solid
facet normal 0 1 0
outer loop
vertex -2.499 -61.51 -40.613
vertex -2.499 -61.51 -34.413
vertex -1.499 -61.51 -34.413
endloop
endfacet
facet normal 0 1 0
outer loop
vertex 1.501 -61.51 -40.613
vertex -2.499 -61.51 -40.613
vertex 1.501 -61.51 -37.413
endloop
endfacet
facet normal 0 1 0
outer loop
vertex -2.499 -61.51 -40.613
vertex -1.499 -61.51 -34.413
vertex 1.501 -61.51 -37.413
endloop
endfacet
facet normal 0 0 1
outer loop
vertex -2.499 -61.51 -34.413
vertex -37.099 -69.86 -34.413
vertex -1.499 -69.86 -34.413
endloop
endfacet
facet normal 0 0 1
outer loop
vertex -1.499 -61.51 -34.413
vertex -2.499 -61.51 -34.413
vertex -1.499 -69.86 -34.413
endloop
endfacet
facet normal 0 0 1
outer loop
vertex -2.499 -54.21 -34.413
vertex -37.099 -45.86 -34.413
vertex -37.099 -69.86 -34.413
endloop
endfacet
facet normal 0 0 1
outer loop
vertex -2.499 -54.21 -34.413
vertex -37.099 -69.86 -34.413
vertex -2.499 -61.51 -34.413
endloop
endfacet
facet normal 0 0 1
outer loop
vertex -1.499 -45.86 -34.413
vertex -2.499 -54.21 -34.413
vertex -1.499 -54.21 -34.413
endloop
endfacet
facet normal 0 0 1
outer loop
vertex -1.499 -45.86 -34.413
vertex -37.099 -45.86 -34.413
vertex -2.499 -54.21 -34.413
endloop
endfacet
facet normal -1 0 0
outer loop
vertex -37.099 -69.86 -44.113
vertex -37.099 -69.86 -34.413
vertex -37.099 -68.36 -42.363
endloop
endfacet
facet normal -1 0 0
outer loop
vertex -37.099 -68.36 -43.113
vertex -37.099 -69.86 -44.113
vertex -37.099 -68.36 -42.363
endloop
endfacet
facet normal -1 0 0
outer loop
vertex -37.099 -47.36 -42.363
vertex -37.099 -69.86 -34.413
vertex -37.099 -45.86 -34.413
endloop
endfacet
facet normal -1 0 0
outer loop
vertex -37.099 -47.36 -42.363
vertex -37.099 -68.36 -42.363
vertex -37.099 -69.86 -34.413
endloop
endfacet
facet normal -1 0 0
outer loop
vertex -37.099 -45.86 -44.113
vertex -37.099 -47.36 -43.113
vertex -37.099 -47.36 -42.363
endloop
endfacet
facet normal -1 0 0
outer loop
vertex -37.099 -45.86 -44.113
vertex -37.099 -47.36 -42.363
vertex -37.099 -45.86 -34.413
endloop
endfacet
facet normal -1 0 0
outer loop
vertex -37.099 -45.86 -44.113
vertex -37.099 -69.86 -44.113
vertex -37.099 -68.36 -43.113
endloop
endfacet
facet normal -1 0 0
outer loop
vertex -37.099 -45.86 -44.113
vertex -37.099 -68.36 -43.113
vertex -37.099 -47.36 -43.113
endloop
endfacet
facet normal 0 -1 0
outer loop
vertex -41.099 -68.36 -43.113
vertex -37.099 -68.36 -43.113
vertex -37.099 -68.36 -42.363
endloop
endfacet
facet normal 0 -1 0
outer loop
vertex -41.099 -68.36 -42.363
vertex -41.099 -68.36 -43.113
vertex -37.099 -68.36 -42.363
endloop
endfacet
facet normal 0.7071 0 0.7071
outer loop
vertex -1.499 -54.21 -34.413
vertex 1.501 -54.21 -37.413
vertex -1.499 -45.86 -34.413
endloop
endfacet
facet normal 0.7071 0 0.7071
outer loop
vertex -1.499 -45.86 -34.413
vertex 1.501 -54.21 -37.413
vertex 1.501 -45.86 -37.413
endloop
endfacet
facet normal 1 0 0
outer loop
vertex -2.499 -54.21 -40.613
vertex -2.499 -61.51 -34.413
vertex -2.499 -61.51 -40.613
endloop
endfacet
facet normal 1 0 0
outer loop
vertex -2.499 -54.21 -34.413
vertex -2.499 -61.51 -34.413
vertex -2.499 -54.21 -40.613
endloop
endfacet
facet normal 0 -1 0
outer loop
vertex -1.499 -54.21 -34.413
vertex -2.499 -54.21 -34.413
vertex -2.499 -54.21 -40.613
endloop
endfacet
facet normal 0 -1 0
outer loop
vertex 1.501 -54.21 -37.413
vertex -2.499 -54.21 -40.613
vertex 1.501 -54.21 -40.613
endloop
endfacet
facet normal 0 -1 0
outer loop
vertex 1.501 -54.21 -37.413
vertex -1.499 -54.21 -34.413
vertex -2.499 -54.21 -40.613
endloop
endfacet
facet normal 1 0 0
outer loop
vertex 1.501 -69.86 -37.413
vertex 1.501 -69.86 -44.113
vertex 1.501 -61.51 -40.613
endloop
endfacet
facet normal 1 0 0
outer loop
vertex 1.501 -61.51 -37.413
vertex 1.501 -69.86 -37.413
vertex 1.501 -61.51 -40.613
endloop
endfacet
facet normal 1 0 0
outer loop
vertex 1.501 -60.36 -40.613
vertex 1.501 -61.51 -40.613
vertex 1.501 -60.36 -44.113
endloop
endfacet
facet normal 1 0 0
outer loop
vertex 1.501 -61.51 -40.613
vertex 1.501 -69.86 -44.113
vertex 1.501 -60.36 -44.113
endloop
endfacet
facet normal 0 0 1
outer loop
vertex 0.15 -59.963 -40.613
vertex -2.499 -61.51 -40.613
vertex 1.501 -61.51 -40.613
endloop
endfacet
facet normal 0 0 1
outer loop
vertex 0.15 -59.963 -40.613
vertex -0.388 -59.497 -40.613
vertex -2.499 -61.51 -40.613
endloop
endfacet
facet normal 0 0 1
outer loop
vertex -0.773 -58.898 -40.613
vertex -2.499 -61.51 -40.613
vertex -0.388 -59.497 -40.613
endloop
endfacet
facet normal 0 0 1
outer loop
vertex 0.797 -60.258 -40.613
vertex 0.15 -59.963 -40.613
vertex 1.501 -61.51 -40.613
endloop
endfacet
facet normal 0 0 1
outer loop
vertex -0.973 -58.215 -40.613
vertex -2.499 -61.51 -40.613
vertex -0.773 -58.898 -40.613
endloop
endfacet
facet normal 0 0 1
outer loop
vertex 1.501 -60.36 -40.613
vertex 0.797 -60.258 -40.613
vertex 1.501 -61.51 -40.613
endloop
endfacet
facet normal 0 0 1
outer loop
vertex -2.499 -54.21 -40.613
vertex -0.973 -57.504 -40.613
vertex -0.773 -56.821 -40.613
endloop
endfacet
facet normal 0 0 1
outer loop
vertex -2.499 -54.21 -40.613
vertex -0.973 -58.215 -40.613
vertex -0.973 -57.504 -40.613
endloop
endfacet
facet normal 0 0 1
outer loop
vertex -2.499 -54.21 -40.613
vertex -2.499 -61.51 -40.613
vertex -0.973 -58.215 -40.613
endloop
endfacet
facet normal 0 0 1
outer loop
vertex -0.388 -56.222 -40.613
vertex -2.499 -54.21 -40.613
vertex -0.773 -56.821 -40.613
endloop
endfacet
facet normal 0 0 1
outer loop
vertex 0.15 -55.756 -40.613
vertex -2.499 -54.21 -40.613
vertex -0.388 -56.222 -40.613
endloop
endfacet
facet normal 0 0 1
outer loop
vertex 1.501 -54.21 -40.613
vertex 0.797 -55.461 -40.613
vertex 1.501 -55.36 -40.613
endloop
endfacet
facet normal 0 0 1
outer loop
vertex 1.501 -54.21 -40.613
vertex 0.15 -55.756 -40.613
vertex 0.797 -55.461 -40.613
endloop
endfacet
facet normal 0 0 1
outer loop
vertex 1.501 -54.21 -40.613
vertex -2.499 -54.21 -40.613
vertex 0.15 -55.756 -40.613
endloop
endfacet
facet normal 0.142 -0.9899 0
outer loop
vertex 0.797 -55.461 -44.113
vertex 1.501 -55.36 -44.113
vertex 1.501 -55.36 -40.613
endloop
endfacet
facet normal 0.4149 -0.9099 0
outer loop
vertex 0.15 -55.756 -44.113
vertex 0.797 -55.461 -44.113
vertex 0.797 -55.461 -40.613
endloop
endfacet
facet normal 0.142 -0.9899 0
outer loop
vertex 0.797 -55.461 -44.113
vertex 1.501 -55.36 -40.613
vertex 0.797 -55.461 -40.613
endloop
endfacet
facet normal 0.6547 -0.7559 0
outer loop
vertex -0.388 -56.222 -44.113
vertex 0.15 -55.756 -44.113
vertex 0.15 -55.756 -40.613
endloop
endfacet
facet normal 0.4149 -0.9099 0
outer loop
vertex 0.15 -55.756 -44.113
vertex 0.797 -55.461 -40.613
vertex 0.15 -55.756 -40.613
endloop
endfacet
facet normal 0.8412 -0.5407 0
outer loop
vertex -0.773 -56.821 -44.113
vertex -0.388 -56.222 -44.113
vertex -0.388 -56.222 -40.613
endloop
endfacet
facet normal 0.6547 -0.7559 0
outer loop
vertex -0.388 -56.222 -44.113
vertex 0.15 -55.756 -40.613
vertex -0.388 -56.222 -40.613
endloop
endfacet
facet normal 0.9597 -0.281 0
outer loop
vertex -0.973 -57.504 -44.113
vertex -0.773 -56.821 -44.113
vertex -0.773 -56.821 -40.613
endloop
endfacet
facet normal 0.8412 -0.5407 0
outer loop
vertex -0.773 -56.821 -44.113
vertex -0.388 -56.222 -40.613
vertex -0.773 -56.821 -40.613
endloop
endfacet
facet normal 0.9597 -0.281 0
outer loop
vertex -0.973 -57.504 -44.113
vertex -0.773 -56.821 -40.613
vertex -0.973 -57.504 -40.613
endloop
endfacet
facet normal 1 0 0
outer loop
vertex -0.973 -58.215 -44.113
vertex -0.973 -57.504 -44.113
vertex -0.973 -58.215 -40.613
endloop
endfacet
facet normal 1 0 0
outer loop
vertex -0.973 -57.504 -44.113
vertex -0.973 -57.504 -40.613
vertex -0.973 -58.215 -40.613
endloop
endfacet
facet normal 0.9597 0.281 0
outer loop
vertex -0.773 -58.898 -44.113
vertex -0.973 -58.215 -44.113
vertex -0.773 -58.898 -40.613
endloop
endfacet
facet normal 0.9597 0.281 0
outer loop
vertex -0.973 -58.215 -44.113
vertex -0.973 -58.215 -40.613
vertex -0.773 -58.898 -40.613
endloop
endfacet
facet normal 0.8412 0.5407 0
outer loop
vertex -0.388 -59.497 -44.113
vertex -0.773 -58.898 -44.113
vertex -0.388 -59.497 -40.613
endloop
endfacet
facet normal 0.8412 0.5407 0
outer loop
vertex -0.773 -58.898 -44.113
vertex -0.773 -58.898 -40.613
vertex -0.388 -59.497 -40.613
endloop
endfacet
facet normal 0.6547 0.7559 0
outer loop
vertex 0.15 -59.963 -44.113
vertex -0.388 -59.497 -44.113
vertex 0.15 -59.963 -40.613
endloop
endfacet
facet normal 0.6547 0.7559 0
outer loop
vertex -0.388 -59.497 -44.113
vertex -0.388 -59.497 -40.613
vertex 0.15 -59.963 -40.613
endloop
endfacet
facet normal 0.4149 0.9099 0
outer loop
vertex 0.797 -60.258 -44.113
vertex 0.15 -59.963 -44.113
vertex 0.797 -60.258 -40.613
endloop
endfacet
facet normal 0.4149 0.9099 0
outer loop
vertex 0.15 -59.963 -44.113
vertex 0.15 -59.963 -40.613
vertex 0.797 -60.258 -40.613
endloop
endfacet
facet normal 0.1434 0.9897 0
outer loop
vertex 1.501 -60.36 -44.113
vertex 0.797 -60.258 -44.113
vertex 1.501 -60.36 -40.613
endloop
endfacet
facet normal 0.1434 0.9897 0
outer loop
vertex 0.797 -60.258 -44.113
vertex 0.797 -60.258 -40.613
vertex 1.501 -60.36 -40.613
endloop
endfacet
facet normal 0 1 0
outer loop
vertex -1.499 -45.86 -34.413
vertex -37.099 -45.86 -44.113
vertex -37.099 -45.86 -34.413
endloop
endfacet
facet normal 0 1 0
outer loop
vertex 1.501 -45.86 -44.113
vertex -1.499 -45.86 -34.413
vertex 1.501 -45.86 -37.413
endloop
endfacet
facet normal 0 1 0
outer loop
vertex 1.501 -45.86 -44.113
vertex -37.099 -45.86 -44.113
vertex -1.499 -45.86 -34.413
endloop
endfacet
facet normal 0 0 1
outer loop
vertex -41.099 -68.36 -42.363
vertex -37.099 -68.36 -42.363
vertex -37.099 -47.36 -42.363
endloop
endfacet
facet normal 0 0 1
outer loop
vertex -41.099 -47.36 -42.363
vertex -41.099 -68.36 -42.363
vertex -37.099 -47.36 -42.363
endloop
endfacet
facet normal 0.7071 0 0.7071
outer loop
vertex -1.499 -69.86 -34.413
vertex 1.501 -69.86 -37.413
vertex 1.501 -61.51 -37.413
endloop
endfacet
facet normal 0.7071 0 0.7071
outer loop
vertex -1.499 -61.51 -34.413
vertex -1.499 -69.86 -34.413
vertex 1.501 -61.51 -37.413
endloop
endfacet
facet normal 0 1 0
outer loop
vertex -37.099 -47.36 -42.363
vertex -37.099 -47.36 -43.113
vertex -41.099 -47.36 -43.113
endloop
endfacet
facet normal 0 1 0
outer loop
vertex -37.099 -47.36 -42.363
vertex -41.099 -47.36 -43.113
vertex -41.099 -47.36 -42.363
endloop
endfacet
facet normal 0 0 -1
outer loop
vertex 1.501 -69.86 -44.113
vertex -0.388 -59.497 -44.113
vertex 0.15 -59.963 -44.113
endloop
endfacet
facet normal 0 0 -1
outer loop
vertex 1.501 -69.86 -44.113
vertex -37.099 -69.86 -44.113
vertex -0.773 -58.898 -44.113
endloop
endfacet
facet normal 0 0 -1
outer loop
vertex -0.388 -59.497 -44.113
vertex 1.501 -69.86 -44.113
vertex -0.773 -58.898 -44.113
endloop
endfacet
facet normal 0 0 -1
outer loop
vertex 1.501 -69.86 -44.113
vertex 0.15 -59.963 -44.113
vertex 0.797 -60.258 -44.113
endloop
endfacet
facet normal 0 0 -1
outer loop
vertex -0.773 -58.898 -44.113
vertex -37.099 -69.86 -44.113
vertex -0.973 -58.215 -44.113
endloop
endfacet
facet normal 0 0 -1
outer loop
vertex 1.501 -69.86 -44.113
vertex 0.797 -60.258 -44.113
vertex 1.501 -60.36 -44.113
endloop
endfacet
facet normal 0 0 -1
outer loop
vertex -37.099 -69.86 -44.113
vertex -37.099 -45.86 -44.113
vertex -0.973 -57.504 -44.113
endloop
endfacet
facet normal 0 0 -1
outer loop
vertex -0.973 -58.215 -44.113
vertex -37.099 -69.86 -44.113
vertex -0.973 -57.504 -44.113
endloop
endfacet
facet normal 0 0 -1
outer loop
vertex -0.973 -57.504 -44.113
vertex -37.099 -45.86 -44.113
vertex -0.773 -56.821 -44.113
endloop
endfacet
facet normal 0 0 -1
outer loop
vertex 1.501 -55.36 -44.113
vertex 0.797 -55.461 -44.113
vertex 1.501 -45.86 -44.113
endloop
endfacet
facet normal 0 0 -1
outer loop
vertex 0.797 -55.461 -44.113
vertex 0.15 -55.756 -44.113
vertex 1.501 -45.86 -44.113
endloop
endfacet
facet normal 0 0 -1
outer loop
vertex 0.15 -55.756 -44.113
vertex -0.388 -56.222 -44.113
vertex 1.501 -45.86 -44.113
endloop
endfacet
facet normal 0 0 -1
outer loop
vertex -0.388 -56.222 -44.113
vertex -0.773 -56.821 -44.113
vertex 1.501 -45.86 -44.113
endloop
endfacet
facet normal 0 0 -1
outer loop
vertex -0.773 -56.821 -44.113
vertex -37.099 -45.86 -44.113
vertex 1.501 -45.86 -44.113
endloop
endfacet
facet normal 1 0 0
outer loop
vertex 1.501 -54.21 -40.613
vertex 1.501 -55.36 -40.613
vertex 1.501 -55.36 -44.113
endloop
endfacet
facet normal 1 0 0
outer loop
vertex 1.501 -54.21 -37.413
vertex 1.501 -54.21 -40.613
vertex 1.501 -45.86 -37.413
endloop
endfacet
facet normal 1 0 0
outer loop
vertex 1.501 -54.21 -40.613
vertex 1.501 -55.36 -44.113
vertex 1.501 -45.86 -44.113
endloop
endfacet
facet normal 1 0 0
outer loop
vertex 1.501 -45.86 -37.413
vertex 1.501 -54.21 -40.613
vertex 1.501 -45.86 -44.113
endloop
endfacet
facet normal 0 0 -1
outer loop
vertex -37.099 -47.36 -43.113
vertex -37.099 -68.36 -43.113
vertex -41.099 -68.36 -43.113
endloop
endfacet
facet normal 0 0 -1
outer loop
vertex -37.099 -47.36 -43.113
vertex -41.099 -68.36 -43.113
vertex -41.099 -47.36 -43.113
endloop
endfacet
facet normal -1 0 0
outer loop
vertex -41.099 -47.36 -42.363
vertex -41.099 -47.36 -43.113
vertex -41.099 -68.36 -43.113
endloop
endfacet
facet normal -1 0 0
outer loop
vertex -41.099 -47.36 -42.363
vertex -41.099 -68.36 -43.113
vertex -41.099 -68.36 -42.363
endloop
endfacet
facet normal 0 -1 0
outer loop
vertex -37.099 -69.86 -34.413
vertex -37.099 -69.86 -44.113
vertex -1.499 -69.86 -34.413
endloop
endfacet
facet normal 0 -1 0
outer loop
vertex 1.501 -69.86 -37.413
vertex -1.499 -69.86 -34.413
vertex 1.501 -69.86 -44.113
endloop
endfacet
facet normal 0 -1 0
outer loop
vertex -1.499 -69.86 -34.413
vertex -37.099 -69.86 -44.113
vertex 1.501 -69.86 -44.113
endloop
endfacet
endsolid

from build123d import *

# Parameters (mm, degrees)
SKETCH_1_W          = 38.6
SKETCH_1_H          = 24
EXTRUDE_1_DEPTH     = 9.7
SKETCH_2_W          = 0.75
SKETCH_2_H          = 21
EXTRUDE_2_DEPTH     = 4
CHAMFER_1_SIZE      = 3
SKETCH_3_W          = 4
SKETCH_3_H          = 7.3
CUT_EXTRUDE_1_DEPTH = 6.2
SKETCH_4_R          = 2.5
CUT_EXTRUDE_2_DEPTH = 4.5


with BuildPart() as part:
    # 草图1 → 凸台-拉伸1 (new body)
    with BuildSketch(Plane(origin=(28.693608134, -23.996349429, -44.112502039), x_dir=(1, 0, 0), z_dir=(0, 0, 1))):
        with Locations((-46.492248891, -33.863193326)):
            Rectangle(SKETCH_1_W, SKETCH_1_H)
    extrude(amount=EXTRUDE_1_DEPTH)

    # 草图2 → 凸台-拉伸2 (add)
    with BuildSketch(Plane.ZY.offset(37.098640757)):
        with Locations((-42.737502039, -57.859542755)):
            Rectangle(SKETCH_2_W, SKETCH_2_H)
    extrude(amount=EXTRUDE_2_DEPTH)

    # 倒角1
    chamfer_1_edges = [part.edges().sort_by_distance(p)[0] for p in [
        (1.501359243, -57.859542755, -34.412502039),
    ]]
    chamfer(chamfer_1_edges, length=CHAMFER_1_SIZE)

    # 草图3 → 切除-拉伸1 (cut)
    with BuildSketch(Plane.XY.offset(-34.412502039)):
        with Locations((-0.498640757, -57.859542755)):
            Rectangle(SKETCH_3_W, SKETCH_3_H)
    extrude(amount=-CUT_EXTRUDE_1_DEPTH, mode=Mode.SUBTRACT)

    # 草图4 → 切除-拉伸2 (cut, through all)
    with BuildSketch(Plane.XY.offset(-40.612502039)):
        with Locations((1.501359243, -57.859542755)):
            Circle(SKETCH_4_R)
    extrude(amount=-CUT_EXTRUDE_2_DEPTH, mode=Mode.SUBTRACT)


solid = part.part
